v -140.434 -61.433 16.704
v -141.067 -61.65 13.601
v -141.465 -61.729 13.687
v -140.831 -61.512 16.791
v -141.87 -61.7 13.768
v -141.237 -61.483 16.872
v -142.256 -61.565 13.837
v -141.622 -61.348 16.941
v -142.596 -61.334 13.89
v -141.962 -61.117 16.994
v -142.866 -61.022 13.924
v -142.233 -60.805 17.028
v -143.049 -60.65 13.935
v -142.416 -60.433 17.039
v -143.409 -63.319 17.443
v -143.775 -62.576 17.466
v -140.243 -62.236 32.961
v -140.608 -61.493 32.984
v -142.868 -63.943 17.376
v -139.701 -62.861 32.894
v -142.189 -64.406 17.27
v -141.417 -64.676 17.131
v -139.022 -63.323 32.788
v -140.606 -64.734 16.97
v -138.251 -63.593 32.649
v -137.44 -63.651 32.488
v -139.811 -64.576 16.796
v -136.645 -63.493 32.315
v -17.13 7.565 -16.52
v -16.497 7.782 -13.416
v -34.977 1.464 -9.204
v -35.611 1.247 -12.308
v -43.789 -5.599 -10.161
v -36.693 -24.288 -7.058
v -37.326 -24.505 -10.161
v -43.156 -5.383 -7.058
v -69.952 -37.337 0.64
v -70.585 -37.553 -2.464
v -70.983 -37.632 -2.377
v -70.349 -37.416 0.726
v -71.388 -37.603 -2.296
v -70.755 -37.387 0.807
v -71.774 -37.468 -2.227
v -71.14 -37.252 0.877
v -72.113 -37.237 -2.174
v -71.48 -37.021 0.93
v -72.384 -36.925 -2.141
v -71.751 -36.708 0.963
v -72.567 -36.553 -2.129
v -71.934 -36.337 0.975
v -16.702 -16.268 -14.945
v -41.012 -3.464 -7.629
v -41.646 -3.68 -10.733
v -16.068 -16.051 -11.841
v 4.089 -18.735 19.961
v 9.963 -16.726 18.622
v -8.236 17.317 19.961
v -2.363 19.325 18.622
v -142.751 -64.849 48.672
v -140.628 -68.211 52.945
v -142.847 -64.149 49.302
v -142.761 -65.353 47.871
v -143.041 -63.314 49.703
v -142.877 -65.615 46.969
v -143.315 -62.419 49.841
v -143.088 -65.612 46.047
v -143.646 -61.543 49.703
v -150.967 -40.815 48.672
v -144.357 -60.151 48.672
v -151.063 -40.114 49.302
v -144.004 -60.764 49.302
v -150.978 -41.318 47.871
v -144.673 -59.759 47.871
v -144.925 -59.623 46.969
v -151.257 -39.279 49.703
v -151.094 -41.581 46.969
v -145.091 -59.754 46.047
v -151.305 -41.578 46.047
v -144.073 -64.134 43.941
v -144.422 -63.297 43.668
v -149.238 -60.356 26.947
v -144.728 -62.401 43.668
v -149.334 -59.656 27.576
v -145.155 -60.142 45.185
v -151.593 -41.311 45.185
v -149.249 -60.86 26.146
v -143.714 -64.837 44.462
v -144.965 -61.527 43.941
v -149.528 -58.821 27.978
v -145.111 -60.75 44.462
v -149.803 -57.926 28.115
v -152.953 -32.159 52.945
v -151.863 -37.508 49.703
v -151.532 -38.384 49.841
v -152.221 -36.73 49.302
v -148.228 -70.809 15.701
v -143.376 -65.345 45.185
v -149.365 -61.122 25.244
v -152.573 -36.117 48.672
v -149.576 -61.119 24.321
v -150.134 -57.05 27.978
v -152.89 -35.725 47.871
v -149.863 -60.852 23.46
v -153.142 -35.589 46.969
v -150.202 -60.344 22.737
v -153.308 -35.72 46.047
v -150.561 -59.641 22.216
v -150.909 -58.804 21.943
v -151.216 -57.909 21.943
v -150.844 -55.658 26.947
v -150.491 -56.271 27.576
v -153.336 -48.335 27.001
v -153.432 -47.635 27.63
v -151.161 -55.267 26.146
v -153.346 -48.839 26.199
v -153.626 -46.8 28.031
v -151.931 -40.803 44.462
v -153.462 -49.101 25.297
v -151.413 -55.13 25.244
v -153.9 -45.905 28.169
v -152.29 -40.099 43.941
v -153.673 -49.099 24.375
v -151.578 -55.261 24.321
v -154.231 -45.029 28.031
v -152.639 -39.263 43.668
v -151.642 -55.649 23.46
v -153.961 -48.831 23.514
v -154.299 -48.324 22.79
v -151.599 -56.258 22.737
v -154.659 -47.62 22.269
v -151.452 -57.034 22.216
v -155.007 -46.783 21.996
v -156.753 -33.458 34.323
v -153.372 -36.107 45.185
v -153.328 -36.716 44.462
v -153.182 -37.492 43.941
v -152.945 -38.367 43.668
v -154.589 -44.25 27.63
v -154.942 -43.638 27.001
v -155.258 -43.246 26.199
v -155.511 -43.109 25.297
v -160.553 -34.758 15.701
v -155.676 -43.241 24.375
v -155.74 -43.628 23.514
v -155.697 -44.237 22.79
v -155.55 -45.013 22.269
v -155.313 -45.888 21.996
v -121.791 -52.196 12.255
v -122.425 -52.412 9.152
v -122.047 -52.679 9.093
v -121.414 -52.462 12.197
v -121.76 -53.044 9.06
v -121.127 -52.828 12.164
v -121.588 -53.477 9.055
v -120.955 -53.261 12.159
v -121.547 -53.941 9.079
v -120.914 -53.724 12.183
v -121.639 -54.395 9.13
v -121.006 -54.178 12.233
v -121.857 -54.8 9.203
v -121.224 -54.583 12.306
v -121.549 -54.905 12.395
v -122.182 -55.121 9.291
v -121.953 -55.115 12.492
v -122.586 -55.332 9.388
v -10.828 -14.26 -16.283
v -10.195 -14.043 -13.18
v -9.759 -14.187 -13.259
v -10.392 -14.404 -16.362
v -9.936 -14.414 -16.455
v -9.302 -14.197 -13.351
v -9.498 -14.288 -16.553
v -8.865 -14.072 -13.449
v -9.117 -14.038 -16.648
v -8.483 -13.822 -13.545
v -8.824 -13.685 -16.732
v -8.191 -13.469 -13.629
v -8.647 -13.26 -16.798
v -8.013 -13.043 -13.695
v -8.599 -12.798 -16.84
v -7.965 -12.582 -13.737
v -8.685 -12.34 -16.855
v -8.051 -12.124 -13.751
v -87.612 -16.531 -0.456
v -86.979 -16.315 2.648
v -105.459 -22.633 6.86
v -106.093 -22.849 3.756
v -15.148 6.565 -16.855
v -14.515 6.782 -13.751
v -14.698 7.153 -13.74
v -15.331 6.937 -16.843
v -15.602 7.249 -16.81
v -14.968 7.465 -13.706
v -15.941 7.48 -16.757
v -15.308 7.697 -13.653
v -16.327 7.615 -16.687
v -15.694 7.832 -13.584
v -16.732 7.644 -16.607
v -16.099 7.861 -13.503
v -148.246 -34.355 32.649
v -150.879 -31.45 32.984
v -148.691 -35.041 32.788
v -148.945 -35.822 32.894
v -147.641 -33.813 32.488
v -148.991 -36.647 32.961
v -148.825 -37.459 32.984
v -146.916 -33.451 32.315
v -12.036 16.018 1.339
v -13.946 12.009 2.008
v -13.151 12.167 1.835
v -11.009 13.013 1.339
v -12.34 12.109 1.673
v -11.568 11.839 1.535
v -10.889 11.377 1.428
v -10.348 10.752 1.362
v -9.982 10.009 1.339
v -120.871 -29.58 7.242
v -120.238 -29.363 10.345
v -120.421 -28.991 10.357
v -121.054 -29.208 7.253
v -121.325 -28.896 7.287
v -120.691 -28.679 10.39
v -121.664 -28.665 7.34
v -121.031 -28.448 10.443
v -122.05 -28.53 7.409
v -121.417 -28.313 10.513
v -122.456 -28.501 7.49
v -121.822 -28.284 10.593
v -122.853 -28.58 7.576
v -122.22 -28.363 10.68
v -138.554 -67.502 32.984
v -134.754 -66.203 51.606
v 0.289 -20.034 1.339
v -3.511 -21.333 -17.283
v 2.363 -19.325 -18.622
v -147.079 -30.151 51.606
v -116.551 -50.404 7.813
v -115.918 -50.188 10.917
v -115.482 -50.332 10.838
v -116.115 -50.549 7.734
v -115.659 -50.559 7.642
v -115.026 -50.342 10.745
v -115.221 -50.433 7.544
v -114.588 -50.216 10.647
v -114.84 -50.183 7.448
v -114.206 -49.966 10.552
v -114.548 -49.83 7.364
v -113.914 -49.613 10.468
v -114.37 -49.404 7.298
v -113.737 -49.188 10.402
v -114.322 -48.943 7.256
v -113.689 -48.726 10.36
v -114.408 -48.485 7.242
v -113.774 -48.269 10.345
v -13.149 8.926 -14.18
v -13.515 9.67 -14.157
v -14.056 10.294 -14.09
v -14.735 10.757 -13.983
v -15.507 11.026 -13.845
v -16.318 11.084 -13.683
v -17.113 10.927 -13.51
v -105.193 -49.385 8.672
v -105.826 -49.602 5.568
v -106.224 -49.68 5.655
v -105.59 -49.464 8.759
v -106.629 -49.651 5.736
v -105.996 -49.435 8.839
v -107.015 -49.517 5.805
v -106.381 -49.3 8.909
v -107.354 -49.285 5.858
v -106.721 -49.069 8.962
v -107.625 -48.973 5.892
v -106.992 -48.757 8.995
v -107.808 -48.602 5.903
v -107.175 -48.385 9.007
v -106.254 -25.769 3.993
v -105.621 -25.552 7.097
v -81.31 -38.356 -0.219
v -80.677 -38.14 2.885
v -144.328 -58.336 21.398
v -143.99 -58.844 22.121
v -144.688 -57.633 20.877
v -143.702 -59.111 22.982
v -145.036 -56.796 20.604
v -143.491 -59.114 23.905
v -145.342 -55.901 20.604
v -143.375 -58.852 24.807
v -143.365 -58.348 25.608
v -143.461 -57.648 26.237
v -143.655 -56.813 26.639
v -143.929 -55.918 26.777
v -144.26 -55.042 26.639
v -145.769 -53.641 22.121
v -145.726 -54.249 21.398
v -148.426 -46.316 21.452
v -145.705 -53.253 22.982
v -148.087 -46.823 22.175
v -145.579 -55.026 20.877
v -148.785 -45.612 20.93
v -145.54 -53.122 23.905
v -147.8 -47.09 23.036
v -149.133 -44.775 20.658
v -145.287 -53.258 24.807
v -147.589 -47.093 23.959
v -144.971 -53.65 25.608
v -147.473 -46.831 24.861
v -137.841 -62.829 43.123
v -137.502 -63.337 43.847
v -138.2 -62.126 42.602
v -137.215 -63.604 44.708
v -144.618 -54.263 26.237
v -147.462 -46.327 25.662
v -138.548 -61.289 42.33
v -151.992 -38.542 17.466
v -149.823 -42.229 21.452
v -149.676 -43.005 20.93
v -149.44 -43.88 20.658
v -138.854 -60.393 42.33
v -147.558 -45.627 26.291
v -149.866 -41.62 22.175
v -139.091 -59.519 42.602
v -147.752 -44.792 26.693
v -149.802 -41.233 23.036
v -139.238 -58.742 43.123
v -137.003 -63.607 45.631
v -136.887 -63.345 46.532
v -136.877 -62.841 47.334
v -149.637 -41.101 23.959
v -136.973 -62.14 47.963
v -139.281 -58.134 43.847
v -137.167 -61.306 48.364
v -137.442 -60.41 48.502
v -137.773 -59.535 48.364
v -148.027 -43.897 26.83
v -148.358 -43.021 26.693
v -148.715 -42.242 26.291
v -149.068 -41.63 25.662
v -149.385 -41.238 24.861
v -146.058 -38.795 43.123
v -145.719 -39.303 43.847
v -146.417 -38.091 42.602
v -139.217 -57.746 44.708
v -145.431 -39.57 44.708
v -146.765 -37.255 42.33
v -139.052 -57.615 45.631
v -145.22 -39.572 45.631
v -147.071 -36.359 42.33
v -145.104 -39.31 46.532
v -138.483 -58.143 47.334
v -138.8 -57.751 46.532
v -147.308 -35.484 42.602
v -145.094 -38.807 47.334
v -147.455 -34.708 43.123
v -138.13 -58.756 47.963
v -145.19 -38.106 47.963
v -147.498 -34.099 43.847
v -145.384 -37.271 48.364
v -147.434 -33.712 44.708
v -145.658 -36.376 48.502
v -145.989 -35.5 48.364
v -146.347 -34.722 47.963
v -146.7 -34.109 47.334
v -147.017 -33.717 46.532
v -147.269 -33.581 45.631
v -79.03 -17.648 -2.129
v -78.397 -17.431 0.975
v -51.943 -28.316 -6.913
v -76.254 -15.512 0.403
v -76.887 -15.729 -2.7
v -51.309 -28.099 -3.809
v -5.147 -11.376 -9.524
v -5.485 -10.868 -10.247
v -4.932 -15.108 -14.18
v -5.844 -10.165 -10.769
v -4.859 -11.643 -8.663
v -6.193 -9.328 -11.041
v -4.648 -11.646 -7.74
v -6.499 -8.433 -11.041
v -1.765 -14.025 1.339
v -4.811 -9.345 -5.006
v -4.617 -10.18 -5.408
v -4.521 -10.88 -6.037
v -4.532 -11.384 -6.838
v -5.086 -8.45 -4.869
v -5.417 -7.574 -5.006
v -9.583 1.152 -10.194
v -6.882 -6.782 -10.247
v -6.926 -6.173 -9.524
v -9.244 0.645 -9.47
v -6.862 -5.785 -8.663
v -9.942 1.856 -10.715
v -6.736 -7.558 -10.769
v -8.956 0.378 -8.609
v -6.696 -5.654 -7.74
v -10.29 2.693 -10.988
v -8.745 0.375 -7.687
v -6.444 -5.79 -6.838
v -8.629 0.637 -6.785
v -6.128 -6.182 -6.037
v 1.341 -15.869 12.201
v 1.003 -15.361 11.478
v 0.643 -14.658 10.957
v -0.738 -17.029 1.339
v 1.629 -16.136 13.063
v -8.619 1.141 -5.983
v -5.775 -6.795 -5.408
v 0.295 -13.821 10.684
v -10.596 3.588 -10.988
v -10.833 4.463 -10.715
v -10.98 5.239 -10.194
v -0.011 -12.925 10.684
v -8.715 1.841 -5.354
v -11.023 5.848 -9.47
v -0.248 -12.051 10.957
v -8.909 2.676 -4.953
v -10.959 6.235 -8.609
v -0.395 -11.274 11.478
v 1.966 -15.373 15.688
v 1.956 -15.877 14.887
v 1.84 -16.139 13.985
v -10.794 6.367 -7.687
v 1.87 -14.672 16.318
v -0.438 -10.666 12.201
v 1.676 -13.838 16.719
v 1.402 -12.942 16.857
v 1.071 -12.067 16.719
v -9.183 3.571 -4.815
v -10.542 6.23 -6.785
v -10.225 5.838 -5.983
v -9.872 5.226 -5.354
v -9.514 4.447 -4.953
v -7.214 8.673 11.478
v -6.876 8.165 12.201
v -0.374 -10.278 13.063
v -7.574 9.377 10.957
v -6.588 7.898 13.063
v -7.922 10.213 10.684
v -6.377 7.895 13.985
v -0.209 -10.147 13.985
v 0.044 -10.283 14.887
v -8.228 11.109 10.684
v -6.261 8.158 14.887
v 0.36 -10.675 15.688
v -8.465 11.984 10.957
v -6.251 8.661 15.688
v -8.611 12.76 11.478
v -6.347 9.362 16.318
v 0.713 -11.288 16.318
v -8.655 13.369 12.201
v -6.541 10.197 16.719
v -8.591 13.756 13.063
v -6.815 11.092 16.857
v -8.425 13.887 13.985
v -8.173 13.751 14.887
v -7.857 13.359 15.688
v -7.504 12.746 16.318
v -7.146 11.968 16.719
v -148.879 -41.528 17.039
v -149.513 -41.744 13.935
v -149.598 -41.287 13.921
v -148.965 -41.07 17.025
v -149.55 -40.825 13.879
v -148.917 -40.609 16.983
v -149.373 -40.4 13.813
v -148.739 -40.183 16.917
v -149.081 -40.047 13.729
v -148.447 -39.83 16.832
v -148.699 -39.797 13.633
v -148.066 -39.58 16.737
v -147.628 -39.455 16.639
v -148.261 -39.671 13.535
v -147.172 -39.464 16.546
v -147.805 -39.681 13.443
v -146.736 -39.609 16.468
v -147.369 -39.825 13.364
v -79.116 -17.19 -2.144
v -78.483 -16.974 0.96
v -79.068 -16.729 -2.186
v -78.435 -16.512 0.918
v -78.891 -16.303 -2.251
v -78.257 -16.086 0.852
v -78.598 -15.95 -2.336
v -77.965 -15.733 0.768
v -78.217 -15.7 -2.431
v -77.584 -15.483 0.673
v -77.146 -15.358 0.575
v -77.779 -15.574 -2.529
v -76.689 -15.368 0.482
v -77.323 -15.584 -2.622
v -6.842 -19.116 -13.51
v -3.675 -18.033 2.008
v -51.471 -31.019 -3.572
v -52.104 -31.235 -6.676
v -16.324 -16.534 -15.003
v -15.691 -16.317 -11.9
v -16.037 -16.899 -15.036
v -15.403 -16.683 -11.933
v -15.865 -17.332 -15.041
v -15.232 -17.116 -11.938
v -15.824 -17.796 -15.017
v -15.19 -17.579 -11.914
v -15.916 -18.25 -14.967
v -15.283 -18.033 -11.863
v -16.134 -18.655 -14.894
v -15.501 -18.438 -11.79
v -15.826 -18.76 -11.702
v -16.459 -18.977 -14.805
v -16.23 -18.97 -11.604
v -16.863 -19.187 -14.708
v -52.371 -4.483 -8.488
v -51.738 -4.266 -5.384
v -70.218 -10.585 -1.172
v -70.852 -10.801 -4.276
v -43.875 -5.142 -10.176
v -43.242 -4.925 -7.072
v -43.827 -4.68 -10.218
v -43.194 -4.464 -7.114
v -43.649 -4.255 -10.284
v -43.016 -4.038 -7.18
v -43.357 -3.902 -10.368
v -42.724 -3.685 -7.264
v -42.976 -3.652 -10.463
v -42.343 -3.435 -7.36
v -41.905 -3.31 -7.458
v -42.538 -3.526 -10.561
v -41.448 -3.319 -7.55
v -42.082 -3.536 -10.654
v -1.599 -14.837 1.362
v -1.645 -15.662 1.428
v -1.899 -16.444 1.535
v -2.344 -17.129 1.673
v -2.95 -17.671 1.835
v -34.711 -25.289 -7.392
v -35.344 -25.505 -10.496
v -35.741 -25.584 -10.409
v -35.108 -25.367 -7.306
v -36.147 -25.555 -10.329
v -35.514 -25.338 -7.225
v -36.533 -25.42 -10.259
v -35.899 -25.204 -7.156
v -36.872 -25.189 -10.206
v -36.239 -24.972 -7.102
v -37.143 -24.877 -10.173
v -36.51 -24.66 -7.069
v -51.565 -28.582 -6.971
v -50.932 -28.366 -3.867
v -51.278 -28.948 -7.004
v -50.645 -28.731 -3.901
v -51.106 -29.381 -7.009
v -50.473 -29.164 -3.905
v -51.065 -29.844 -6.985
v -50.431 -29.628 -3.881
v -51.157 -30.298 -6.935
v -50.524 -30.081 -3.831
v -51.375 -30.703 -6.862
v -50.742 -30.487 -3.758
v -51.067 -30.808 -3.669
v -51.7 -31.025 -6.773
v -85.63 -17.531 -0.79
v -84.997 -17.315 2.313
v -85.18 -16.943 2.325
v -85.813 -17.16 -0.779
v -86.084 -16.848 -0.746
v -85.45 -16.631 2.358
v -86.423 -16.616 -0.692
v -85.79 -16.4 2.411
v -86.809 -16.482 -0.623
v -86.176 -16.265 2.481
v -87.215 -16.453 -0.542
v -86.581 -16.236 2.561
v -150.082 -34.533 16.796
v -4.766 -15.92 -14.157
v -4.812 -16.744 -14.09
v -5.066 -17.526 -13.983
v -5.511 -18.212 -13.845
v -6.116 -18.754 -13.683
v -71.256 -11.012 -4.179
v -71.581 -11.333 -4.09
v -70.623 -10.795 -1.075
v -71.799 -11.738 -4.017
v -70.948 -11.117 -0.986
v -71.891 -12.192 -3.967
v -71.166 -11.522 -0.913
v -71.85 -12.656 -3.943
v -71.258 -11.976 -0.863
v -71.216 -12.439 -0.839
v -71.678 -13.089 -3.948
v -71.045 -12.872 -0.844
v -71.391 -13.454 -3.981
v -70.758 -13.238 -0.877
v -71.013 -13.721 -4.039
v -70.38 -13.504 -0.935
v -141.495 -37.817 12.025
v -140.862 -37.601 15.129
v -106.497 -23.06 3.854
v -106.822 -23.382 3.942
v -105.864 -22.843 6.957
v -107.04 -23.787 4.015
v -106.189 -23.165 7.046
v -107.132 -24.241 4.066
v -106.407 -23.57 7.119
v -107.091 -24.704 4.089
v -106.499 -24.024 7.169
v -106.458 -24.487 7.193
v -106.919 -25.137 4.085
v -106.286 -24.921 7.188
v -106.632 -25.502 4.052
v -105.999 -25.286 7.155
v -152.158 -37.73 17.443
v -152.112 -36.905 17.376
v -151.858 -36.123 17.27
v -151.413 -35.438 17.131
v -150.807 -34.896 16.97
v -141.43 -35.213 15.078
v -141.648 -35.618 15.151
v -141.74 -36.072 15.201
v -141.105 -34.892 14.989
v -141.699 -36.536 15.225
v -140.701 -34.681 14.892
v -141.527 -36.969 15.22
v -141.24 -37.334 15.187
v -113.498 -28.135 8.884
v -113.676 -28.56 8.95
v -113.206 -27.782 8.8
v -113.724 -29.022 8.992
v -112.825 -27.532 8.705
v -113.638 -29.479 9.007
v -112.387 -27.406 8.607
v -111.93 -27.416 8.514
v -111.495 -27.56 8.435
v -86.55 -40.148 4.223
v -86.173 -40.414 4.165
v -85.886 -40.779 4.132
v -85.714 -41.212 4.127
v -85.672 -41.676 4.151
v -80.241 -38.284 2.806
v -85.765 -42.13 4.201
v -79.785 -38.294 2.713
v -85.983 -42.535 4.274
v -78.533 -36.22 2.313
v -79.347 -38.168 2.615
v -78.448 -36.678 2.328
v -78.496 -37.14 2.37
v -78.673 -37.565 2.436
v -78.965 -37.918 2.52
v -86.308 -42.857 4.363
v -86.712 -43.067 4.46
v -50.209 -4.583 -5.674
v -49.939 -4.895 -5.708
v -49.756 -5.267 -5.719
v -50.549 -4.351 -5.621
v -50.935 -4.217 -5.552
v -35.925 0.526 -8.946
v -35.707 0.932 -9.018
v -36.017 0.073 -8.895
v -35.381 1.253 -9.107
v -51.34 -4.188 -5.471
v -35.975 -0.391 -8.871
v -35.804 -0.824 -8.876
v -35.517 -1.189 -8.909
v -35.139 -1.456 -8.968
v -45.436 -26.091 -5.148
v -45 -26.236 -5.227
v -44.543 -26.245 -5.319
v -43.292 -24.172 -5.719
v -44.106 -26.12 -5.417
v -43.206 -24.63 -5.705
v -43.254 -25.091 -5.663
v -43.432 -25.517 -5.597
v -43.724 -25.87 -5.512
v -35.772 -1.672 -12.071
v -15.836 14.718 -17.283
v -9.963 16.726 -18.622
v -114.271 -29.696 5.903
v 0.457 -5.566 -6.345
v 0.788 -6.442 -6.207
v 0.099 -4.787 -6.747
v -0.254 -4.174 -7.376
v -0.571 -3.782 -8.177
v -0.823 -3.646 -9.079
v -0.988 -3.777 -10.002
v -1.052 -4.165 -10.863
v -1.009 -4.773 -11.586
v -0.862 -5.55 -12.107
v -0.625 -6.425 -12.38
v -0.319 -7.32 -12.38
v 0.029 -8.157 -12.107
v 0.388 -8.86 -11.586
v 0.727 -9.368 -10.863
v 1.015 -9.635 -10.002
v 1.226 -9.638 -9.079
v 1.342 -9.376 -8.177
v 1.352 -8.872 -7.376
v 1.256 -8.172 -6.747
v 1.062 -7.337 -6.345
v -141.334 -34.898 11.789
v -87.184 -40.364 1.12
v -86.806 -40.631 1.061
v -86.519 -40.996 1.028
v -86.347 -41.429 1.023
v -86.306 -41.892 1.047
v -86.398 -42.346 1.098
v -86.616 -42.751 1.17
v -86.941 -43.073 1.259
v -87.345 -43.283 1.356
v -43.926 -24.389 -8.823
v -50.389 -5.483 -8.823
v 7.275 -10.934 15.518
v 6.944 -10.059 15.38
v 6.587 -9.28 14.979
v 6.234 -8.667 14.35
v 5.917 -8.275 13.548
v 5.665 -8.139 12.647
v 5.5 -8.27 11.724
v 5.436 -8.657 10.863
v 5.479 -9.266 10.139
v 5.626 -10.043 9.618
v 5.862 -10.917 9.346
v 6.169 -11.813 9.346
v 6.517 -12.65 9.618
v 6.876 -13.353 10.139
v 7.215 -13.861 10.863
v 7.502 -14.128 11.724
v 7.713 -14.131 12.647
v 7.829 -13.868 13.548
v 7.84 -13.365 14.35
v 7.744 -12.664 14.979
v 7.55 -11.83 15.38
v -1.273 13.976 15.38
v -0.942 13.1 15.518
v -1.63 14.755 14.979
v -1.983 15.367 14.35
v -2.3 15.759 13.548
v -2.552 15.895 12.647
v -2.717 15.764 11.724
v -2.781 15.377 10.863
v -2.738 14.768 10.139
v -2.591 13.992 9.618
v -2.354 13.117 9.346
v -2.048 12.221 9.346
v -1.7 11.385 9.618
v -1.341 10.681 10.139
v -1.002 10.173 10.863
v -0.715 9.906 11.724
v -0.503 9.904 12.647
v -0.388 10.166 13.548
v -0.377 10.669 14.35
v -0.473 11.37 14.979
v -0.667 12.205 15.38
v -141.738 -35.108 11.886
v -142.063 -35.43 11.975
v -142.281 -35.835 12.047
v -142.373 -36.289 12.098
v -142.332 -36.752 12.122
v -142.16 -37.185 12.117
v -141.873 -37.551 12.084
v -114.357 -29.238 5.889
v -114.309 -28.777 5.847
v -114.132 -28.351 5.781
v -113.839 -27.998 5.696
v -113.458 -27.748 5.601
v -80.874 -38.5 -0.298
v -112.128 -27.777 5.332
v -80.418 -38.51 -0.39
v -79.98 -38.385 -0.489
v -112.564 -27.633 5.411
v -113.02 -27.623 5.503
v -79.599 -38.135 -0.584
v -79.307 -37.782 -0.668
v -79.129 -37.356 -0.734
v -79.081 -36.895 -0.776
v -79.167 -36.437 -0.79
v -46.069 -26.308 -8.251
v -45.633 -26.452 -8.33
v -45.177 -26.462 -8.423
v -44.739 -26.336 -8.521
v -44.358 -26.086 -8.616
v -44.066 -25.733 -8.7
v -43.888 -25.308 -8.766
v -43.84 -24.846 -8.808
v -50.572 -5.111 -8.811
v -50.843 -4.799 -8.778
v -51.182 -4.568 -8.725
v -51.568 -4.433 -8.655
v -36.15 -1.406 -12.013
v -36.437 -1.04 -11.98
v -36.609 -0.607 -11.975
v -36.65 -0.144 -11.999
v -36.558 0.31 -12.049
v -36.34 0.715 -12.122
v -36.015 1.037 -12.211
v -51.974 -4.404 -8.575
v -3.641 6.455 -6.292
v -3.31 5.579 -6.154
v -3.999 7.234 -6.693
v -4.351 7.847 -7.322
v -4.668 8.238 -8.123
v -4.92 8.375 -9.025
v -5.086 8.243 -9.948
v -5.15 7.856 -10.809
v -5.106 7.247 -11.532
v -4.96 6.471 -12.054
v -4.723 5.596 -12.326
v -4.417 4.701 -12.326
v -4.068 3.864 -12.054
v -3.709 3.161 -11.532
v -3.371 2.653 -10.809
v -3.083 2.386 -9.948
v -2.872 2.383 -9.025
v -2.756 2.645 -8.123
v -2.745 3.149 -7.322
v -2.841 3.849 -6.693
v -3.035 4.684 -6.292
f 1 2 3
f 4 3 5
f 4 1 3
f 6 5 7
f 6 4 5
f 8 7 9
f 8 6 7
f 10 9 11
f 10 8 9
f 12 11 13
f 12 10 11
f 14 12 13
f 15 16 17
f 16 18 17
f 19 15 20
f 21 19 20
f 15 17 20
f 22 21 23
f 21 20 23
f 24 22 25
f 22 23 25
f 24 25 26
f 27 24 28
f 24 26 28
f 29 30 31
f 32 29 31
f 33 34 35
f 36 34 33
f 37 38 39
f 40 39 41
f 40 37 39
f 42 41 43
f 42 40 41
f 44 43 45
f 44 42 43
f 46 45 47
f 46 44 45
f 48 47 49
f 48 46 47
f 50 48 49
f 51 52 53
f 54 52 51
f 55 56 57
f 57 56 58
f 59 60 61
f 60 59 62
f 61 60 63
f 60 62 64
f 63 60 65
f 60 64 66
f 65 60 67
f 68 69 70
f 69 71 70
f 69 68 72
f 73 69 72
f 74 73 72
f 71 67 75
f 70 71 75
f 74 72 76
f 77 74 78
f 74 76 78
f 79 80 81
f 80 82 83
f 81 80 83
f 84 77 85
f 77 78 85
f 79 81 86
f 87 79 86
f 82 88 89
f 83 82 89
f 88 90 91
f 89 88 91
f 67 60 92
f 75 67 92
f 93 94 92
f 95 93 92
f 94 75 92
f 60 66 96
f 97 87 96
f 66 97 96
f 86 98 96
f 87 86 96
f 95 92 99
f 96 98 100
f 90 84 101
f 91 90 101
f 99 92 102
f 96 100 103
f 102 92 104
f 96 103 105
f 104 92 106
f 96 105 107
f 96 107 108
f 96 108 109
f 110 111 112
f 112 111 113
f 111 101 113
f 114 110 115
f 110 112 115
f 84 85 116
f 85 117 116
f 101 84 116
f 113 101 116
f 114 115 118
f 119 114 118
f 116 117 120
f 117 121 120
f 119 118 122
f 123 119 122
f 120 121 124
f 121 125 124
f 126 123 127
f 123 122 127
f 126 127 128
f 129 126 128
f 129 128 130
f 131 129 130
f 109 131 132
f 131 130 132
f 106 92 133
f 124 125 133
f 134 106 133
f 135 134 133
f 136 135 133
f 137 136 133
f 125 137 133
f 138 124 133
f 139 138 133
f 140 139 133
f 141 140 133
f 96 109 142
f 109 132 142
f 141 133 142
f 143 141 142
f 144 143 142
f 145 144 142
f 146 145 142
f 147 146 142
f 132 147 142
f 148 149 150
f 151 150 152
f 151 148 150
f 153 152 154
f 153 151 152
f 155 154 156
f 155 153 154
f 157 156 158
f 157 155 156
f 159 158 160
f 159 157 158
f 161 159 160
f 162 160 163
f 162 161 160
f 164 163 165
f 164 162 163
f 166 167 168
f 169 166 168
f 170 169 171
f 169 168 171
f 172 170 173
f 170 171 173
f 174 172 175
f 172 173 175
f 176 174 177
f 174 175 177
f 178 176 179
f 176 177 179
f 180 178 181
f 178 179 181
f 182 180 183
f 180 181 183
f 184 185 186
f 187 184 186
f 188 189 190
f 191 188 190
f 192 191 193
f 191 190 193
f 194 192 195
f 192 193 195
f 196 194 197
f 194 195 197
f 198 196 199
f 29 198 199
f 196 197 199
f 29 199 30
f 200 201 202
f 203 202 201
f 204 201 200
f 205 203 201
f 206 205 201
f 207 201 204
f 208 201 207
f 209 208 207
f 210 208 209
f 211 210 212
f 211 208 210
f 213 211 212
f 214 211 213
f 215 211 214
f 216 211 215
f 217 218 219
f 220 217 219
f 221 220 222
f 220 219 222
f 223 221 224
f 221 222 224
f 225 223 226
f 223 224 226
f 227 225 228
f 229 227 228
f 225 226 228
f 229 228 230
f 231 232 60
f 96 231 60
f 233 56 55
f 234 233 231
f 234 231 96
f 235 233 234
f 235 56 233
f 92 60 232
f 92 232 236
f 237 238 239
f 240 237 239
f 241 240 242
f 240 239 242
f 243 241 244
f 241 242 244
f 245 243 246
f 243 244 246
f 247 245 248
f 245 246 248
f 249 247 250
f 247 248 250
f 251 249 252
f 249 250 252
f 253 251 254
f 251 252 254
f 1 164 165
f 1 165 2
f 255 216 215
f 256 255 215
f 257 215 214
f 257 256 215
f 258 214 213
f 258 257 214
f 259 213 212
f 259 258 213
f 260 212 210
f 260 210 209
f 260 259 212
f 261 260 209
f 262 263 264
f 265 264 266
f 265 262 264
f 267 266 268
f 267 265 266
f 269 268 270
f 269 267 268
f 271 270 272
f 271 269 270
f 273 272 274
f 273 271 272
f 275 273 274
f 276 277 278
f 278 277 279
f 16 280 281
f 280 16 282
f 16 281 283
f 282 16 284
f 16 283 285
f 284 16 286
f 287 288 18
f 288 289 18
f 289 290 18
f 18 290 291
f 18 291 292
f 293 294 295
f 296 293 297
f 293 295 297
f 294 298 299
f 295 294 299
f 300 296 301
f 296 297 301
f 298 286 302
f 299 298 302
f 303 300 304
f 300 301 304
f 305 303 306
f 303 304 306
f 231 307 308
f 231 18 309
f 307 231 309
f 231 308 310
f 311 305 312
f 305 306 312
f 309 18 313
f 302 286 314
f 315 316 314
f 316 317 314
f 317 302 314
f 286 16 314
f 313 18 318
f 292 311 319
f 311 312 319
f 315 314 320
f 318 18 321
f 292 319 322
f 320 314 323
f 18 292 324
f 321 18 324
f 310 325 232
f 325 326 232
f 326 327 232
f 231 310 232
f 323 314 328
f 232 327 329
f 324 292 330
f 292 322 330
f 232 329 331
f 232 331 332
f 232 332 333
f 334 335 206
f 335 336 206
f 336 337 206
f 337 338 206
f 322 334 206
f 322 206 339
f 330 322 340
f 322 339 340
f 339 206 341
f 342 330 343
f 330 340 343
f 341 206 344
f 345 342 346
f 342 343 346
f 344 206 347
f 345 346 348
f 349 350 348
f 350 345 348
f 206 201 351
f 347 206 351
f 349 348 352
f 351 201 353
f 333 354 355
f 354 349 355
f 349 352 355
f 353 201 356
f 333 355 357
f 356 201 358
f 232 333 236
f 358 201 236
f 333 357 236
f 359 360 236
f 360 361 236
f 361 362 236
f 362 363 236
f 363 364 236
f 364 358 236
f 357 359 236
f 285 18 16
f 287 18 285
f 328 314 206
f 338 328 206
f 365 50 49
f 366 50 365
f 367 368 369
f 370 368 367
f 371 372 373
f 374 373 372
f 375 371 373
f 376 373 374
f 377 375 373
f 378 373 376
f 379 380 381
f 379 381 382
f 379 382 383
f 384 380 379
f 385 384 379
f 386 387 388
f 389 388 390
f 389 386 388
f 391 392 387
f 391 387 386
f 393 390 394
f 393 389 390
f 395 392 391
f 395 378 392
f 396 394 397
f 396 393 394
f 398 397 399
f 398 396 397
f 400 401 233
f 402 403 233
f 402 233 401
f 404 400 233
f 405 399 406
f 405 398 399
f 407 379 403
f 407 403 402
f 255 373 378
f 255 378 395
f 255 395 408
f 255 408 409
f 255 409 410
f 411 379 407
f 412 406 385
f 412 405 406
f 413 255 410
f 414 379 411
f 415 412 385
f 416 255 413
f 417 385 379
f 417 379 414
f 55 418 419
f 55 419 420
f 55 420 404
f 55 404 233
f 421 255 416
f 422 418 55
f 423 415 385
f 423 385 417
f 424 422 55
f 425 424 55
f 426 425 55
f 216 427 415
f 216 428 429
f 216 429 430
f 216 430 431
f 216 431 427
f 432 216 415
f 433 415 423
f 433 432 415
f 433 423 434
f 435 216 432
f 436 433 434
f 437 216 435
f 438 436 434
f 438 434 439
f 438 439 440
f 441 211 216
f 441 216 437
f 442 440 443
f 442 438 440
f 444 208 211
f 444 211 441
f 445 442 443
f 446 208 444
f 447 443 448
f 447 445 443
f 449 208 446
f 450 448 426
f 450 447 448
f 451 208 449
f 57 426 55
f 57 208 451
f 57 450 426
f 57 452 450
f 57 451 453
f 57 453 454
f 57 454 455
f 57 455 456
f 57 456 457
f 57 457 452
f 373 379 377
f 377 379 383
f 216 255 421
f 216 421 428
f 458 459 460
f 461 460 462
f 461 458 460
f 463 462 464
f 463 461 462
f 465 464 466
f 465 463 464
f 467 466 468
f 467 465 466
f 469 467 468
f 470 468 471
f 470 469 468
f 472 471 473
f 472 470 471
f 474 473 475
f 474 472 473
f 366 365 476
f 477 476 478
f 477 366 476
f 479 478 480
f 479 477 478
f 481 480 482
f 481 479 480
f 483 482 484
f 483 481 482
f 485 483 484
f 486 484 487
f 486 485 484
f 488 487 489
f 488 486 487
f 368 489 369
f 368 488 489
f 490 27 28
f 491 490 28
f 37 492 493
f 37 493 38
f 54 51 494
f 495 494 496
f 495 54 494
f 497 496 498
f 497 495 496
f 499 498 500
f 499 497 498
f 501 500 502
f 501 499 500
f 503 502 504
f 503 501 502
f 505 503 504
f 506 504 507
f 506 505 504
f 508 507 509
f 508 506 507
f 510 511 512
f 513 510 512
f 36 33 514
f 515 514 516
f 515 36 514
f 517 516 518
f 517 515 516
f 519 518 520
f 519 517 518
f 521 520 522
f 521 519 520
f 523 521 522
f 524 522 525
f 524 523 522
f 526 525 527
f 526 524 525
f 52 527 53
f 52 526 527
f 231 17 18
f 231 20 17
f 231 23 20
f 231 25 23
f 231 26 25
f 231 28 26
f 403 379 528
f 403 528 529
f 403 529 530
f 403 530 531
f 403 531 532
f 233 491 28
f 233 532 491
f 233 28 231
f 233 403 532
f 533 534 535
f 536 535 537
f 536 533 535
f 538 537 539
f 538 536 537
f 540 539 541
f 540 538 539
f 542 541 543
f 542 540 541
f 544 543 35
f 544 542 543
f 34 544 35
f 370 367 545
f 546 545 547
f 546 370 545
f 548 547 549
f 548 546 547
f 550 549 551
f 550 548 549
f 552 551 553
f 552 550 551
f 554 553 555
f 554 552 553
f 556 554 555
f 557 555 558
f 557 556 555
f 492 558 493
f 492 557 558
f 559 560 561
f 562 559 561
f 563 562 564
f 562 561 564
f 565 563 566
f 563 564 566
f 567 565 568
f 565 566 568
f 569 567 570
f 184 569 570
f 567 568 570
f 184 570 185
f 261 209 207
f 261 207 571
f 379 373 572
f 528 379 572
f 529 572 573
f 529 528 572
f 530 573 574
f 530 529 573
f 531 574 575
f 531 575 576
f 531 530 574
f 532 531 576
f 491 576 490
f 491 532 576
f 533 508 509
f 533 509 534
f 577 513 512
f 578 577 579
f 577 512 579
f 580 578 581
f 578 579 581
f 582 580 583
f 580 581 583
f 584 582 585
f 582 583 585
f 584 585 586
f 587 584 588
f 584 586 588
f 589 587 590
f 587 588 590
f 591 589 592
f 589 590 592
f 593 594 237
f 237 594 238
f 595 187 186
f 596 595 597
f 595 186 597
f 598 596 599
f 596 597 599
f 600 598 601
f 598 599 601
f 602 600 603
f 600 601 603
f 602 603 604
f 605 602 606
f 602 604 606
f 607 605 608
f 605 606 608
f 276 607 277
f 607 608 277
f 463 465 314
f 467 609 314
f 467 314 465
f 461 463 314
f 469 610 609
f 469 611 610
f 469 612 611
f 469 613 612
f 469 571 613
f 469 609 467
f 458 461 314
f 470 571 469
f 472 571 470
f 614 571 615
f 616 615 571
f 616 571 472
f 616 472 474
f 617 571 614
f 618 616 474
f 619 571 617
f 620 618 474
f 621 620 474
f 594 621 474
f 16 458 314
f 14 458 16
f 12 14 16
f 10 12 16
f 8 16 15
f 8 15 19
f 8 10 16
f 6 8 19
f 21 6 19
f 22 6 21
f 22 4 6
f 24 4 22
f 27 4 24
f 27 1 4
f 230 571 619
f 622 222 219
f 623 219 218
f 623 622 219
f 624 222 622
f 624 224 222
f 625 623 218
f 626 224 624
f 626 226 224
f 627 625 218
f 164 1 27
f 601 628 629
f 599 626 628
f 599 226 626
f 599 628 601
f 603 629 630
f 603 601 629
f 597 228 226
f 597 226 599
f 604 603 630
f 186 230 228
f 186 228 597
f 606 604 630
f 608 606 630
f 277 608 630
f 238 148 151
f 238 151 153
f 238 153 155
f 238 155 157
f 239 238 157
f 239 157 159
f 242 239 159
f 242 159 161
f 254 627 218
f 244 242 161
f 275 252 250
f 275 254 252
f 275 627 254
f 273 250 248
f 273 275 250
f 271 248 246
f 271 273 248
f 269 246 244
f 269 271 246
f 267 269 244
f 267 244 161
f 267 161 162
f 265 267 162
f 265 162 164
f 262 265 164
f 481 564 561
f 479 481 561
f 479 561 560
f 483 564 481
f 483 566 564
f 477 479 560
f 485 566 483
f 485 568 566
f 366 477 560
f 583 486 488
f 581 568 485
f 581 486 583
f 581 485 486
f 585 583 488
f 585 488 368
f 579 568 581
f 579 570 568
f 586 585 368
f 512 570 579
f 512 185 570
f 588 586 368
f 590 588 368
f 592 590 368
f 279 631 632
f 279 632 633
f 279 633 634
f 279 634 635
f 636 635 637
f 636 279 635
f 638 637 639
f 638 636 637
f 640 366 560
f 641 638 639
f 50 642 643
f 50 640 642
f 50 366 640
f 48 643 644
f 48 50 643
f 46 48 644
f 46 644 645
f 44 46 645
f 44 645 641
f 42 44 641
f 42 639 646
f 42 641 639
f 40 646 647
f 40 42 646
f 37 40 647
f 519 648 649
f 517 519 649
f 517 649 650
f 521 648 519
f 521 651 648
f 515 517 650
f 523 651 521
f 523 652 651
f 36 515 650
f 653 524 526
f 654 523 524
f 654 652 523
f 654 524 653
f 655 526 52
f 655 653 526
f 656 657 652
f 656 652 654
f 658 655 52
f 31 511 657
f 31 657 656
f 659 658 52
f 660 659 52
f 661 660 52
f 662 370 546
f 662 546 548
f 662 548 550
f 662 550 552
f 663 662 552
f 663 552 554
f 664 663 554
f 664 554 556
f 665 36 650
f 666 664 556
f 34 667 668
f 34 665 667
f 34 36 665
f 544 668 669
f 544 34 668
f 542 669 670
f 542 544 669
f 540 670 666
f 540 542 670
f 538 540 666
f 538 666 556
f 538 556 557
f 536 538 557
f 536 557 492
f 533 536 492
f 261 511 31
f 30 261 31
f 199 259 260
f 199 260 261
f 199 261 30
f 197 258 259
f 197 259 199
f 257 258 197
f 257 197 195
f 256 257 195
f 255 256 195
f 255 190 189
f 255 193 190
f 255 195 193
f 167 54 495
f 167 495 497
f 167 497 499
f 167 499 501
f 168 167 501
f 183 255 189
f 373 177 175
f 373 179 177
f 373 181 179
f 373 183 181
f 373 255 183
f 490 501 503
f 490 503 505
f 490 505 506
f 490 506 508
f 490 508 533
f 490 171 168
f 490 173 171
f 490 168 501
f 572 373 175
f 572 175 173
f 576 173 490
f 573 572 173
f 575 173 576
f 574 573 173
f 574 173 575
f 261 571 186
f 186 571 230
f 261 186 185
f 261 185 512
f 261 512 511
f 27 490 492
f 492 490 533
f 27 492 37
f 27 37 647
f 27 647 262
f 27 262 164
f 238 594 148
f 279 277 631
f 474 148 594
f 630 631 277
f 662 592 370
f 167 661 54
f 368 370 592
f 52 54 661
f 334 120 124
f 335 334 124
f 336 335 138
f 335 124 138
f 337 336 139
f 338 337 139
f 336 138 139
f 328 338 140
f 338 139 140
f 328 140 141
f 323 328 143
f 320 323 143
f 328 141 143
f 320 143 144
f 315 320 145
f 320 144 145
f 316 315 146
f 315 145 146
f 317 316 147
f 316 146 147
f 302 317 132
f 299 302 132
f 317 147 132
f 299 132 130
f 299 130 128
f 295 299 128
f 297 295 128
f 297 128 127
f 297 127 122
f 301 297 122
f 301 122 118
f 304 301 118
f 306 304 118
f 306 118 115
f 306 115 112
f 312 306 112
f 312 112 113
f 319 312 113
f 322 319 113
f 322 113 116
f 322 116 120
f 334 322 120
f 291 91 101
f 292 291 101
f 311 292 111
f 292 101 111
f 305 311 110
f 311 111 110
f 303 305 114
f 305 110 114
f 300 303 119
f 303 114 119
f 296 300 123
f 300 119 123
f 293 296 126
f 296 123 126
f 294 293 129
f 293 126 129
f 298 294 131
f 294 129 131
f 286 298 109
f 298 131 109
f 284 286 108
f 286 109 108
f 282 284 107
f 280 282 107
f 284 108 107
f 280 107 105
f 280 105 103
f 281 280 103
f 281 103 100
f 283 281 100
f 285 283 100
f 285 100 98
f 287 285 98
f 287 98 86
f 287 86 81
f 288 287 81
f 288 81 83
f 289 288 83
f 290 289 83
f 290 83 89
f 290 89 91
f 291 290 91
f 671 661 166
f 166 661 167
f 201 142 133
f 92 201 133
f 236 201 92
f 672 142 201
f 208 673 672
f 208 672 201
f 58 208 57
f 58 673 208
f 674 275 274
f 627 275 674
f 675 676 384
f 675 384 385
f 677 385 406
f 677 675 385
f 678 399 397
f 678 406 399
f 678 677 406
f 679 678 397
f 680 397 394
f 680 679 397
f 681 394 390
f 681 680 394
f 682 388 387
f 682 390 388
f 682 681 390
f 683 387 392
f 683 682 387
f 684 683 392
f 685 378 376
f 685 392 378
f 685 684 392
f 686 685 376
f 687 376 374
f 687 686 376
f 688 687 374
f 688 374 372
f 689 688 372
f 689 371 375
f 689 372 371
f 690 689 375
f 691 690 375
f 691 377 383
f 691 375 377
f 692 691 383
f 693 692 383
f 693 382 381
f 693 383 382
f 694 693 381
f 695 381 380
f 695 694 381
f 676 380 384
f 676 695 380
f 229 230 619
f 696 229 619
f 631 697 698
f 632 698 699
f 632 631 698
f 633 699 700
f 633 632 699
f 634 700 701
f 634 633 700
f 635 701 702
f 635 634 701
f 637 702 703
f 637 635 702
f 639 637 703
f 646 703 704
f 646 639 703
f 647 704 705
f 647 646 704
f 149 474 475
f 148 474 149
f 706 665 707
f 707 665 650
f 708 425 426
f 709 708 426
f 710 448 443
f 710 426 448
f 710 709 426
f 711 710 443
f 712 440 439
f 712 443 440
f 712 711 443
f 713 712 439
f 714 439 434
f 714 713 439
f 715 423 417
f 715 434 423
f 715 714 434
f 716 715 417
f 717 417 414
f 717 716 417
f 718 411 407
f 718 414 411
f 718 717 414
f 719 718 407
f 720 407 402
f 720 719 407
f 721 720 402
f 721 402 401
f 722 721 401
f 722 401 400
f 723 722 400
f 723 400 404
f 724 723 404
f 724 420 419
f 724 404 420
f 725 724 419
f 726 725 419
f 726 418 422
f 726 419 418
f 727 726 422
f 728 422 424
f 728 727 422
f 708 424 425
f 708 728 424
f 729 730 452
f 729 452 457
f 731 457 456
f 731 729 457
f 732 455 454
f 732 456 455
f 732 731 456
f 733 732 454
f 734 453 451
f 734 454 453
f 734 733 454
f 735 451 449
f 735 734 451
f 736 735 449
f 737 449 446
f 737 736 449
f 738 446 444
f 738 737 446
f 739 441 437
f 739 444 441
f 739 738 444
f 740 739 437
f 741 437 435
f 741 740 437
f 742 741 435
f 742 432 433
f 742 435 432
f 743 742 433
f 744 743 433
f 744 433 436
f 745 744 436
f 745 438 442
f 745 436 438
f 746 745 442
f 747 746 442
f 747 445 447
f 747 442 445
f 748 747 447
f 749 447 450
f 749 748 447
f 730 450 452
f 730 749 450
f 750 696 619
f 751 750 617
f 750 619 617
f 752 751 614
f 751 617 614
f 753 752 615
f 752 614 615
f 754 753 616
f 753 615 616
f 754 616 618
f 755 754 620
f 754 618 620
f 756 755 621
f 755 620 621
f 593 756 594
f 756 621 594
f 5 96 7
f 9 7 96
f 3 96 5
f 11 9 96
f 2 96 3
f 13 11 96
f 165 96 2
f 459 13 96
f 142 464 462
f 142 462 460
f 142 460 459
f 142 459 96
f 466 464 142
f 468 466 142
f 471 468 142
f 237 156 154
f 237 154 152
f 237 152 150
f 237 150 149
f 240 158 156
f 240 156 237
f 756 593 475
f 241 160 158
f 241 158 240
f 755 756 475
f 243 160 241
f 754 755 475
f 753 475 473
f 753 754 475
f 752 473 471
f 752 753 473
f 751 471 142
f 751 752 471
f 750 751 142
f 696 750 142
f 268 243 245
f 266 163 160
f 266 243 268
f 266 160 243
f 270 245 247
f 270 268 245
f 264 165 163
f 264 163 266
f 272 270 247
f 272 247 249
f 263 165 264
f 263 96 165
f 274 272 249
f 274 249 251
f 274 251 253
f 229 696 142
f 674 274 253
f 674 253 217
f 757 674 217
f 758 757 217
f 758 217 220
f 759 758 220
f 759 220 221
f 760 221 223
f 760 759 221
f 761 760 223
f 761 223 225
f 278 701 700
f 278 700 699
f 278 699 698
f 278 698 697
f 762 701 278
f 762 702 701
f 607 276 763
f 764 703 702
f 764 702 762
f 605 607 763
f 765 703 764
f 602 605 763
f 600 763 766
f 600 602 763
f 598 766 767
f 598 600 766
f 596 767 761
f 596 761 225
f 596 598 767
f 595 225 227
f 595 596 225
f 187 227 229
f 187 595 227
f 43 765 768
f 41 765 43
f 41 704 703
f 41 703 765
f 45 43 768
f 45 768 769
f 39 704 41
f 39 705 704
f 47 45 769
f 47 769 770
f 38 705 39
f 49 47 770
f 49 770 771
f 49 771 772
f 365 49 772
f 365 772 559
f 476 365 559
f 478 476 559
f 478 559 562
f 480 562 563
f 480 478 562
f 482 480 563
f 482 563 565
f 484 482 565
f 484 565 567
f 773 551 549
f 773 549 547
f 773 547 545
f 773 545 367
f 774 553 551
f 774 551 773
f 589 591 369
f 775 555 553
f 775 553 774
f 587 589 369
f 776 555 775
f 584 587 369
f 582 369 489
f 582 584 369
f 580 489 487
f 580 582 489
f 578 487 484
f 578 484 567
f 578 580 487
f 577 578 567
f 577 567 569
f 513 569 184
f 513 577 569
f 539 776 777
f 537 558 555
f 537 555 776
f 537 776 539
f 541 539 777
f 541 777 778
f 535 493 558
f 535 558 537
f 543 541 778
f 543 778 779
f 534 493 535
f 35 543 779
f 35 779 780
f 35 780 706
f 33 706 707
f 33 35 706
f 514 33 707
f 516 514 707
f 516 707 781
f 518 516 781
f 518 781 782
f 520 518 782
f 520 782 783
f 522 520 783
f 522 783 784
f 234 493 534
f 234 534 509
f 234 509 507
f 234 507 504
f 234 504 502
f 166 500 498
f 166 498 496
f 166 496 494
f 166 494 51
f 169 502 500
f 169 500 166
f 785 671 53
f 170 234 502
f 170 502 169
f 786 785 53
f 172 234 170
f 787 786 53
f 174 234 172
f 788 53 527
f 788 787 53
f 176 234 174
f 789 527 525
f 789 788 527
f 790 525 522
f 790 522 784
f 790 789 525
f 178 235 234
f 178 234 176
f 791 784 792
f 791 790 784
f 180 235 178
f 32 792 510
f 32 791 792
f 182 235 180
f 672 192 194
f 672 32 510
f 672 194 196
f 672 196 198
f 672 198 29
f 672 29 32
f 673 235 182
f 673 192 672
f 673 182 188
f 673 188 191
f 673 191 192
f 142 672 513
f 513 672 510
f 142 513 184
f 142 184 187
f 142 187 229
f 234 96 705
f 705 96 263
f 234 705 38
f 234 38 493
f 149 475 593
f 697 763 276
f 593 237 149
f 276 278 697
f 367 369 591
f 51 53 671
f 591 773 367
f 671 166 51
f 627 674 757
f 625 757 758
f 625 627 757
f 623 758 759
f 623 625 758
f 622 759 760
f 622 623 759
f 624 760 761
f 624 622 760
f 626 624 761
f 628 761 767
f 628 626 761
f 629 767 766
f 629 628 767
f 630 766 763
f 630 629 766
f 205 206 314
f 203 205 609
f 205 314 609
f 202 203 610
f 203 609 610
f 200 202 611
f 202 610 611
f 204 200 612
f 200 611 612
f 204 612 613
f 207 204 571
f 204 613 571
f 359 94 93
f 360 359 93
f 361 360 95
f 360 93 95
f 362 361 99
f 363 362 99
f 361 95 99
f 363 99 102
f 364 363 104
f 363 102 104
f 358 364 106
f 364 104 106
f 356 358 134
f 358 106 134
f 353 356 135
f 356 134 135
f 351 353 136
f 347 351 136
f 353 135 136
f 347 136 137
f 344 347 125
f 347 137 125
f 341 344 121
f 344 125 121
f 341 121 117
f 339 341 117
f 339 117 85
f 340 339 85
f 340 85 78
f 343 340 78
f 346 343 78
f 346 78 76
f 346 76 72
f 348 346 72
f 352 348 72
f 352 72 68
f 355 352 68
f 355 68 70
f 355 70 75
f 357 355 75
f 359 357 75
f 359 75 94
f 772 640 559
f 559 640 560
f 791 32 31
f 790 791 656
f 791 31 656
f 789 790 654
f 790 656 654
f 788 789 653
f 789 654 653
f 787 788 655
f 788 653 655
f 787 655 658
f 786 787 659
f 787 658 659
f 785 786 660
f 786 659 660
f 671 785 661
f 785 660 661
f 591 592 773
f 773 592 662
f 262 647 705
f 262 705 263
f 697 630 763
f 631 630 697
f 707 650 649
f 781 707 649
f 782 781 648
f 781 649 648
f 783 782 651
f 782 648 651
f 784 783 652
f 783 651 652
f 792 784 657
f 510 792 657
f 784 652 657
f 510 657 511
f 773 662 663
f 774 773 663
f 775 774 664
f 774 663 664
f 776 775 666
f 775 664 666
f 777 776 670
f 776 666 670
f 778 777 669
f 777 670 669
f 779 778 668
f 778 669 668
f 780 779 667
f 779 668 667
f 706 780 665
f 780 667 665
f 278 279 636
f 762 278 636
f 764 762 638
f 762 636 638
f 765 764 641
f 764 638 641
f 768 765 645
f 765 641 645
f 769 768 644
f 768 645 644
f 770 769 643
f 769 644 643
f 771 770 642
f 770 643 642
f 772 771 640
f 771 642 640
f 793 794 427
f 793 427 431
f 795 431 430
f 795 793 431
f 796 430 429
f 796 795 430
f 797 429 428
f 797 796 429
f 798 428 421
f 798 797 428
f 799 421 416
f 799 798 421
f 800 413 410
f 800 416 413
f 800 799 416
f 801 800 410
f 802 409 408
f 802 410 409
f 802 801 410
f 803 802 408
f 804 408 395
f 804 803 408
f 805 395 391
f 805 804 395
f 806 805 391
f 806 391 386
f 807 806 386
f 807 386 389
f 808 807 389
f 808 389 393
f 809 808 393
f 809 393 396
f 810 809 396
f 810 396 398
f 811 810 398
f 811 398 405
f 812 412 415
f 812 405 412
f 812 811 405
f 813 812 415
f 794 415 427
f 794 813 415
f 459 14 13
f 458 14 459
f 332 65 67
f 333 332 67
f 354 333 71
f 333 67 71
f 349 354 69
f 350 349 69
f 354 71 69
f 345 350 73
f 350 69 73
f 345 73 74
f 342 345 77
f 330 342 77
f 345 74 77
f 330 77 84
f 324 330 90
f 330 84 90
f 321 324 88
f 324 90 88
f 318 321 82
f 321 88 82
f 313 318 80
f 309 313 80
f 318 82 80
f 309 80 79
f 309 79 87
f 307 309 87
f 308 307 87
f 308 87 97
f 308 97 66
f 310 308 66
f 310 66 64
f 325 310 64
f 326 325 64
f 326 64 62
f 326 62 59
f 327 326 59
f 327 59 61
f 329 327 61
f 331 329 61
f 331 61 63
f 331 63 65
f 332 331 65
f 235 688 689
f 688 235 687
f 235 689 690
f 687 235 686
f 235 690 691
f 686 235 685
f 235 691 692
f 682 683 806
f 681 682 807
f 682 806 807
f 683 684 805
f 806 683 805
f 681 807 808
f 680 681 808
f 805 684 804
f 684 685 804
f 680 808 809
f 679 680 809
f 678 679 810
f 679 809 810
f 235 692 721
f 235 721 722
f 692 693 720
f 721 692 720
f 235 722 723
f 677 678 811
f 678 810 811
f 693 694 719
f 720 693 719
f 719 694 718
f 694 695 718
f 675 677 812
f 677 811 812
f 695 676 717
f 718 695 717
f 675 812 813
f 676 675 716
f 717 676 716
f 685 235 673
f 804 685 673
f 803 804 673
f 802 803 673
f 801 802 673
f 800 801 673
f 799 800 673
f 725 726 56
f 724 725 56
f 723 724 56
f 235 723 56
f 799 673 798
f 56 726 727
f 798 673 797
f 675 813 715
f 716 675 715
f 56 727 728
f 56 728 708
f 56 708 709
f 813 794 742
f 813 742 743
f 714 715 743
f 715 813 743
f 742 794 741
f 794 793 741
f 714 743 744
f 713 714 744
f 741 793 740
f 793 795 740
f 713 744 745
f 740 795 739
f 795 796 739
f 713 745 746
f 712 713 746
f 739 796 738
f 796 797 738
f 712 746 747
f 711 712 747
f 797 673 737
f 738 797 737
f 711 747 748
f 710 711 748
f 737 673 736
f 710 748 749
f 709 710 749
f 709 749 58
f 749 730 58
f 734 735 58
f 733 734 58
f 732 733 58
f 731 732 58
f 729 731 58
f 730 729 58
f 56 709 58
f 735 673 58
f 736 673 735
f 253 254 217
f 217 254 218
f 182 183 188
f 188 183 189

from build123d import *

# Parameters (mm, degrees)
SKETCH2_W                       = 38.1
SKETCH2_H                       = 38.1
BOSS_EXTRUDE1_DEPTH             = 6.35
BOSS_EXTRUDE2_DEPTH             = 156.456983
SKETCH4_W                       = 38.1
SKETCH4_H                       = 38.1
BOSS_EXTRUDE3_DEPTH             = 6.35
FILLET1_R                       = 3.175
F_1_4_0_25_DIAMETER_HOLE1_D     = 6.35
F_1_4_0_25_DIAMETER_HOLE1_DEPTH = 25.603542527
CUT_EXTRUDE1_REACH              = 187.255
LPATTERN1_COUNT                 = 4
LPATTERN1_PITCH                 = 38.1


with BuildPart() as part:
    # Sketch2 → Boss-Extrude1 (new body)
    with BuildSketch(Plane(origin=(0, 0, 0), x_dir=(0.1994825347085473, 0.06819943394704729, 0.9775252199076787), z_dir=(-0.924962461700774, -0.31622776601683794, 0.21081851067789195))):
        Rectangle(SKETCH2_W, SKETCH2_H)
    extrude(amount=BOSS_EXTRUDE1_DEPTH)

    # Sketch3 → Boss-Extrude2 (add)
    with BuildSketch(Plane(origin=(-5.873511632, -2.008046314, 1.338697543), x_dir=(0.19948253470854727, 0.06819943394704733, 0.9775252199076787), z_dir=(-0.9249624617007739, -0.316227766016838, 0.21081851067789192))):
        Polygon((-15.875, -15.875), (0, -15.875), (0, -19.05), (-19.05, -19.05), (-19.05, 19.05), (0, 19.05), (0, 15.875), (-15.875, 15.875), align=None)
    extrude(amount=BOSS_EXTRUDE2_DEPTH)

    # Sketch4 → Boss-Extrude3 (add)
    with BuildSketch(Plane(origin=(-150.590347718, -51.484088506, 34.32272567), x_dir=(0.19948253470854724, 0.06819943394704728, 0.9775252199076787), z_dir=(-0.924962461700774, -0.31622776601683794, 0.2108185106778919))):
        Rectangle(SKETCH4_W, SKETCH4_H)
    extrude(amount=-BOSS_EXTRUDE3_DEPTH)

    # Fillet1
    fillet1_edges = [part.edges().sort_by_distance(p)[0] for p in [
        (-2.321368427, -17.570760643, -6.42040889),
        (-12.592440075, 12.472002, -6.42040889),
        (-141.164692882, -65.03875652, 25.224921695),
        (-151.435764529, -34.995993877, 25.224921695),
    ]]
    fillet(fillet1_edges, radius=FILLET1_R)

    # 1/4 (0.25) Diameter Hole1
    with Locations(Plane(origin=(-144.716836086, -49.476042191, 32.984028128), x_dir=(-0.19948253470854763, -0.06819943394704747, -0.9775252199076786), z_dir=(0.924962461700774, 0.3162277660168374, -0.2108185106778923))):
        with Locations((9.525, -6.35), (-12.7, -12.7), (-12.7, 12.7), (9.47011661, 6.35)):
            f_1_4_0_25_diameter_hole1 = Hole(F_1_4_0_25_DIAMETER_HOLE1_D / 2, depth=F_1_4_0_25_DIAMETER_HOLE1_DEPTH)

    # Mirror1: 1/4 (0.25) Diameter Hole1 across plane
    add(f_1_4_0_25_diameter_hole1.mirror(Plane(origin=(-75.295173859, -25.742044253, 17.161362835), x_dir=(0.19948253470854732, 0.06819943394704736, 0.9775252199076787), z_dir=(0.924962461700774, 0.316227766016838, -0.21081851067789195))), mode=Mode.SUBTRACT)

    # Sketch9 → Cut-Extrude1 (cut, up to next)
    with BuildSketch(Plane(origin=(-3.166785238, -1.082666014, -15.518212866), x_dir=(0.9799013819493537, -0.013883637884437966, -0.19899880967694392), z_dir=(0.19948253470854727, 0.06819943394704746, 0.9775252199076788)), mode=Mode.PRIVATE) as cut_extrude1_sk1:
        with BuildLine():
            Line((-4.984618665, -11.137455788), (-11.58066581, 7.722289794))
            ThreePointArc((-11.58066581, 7.722289794), (-12.390150485, 8.628384663), (-13.603248415, 8.696698385))
            Line((-13.603248415, 8.696698385), (-32.462993997, 2.100651241))
            ThreePointArc((-32.462993997, 2.100651241), (-33.523895818, 0.691411823), (-32.627917913, -0.828026233))
            Line((-32.627917913, -0.828026233), (-7.172125187, -13.091724671))
            ThreePointArc((-7.172125187, -13.091724671), (-5.425471566, -12.845412794), (-4.984618665, -11.137455788))
        make_face()
    cut_extrude1_tool1 = extrude(cut_extrude1_sk1.sketch, amount=-CUT_EXTRUDE1_REACH, mode=Mode.PRIVATE) & part.part
    # Sketch9 → Cut-Extrude1 (cut, up to next)
    with BuildSketch(Plane(origin=(-3.166785238, -1.082666014, -15.518212866), x_dir=(0.9799013819493537, -0.013883637884437966, -0.19899880967694392), z_dir=(0.19948253470854727, 0.06819943394704746, 0.9775252199076788)), mode=Mode.PRIVATE) as cut_extrude1_sk2:
        with BuildLine():
            Line((-38.621900308, -2.924374261), (-13.166107581, -15.188072699))
            ThreePointArc((-13.166107581, -15.188072699), (-12.270129676, -16.707510755), (-13.331031497, -18.116750174))
            Line((-13.331031497, -18.116750174), (-32.190777079, -24.712797318))
            ThreePointArc((-32.190777079, -24.712797318), (-33.403875009, -24.644483595), (-34.213359685, -23.738388726))
            Line((-34.213359685, -23.738388726), (-40.809406829, -4.878643144))
            ThreePointArc((-40.809406829, -4.878643144), (-40.368553929, -3.170686139), (-38.621900308, -2.924374261))
        make_face()
    cut_extrude1_tool2 = extrude(cut_extrude1_sk2.sketch, amount=-CUT_EXTRUDE1_REACH, mode=Mode.PRIVATE) & part.part
    cut_extrude1_1 = cut_extrude1_tool1.solids().sort_by_distance((-20.084687, -2.329504, -11.978806))[0]
    add(cut_extrude1_1, mode=Mode.SUBTRACT)
    cut_extrude1_2 = cut_extrude1_tool2.solids().sort_by_distance((-31.122512, -15.177301, -8.829971))[0]
    add(cut_extrude1_2, mode=Mode.SUBTRACT)
    cut_extrude1 = cut_extrude1_1 + cut_extrude1_2  # Cut-Extrude1 as one shape, for the pattern or mirror that repeats it

    # LPattern1: Cut-Extrude1 ×4
    with Locations(*[Vector(-0.924962461700774, -0.3162277660168377, 0.210818510677892) * (i * LPATTERN1_PITCH) for i in range(1, LPATTERN1_COUNT)]):
        add(cut_extrude1, mode=Mode.SUBTRACT)


solid = part.part
